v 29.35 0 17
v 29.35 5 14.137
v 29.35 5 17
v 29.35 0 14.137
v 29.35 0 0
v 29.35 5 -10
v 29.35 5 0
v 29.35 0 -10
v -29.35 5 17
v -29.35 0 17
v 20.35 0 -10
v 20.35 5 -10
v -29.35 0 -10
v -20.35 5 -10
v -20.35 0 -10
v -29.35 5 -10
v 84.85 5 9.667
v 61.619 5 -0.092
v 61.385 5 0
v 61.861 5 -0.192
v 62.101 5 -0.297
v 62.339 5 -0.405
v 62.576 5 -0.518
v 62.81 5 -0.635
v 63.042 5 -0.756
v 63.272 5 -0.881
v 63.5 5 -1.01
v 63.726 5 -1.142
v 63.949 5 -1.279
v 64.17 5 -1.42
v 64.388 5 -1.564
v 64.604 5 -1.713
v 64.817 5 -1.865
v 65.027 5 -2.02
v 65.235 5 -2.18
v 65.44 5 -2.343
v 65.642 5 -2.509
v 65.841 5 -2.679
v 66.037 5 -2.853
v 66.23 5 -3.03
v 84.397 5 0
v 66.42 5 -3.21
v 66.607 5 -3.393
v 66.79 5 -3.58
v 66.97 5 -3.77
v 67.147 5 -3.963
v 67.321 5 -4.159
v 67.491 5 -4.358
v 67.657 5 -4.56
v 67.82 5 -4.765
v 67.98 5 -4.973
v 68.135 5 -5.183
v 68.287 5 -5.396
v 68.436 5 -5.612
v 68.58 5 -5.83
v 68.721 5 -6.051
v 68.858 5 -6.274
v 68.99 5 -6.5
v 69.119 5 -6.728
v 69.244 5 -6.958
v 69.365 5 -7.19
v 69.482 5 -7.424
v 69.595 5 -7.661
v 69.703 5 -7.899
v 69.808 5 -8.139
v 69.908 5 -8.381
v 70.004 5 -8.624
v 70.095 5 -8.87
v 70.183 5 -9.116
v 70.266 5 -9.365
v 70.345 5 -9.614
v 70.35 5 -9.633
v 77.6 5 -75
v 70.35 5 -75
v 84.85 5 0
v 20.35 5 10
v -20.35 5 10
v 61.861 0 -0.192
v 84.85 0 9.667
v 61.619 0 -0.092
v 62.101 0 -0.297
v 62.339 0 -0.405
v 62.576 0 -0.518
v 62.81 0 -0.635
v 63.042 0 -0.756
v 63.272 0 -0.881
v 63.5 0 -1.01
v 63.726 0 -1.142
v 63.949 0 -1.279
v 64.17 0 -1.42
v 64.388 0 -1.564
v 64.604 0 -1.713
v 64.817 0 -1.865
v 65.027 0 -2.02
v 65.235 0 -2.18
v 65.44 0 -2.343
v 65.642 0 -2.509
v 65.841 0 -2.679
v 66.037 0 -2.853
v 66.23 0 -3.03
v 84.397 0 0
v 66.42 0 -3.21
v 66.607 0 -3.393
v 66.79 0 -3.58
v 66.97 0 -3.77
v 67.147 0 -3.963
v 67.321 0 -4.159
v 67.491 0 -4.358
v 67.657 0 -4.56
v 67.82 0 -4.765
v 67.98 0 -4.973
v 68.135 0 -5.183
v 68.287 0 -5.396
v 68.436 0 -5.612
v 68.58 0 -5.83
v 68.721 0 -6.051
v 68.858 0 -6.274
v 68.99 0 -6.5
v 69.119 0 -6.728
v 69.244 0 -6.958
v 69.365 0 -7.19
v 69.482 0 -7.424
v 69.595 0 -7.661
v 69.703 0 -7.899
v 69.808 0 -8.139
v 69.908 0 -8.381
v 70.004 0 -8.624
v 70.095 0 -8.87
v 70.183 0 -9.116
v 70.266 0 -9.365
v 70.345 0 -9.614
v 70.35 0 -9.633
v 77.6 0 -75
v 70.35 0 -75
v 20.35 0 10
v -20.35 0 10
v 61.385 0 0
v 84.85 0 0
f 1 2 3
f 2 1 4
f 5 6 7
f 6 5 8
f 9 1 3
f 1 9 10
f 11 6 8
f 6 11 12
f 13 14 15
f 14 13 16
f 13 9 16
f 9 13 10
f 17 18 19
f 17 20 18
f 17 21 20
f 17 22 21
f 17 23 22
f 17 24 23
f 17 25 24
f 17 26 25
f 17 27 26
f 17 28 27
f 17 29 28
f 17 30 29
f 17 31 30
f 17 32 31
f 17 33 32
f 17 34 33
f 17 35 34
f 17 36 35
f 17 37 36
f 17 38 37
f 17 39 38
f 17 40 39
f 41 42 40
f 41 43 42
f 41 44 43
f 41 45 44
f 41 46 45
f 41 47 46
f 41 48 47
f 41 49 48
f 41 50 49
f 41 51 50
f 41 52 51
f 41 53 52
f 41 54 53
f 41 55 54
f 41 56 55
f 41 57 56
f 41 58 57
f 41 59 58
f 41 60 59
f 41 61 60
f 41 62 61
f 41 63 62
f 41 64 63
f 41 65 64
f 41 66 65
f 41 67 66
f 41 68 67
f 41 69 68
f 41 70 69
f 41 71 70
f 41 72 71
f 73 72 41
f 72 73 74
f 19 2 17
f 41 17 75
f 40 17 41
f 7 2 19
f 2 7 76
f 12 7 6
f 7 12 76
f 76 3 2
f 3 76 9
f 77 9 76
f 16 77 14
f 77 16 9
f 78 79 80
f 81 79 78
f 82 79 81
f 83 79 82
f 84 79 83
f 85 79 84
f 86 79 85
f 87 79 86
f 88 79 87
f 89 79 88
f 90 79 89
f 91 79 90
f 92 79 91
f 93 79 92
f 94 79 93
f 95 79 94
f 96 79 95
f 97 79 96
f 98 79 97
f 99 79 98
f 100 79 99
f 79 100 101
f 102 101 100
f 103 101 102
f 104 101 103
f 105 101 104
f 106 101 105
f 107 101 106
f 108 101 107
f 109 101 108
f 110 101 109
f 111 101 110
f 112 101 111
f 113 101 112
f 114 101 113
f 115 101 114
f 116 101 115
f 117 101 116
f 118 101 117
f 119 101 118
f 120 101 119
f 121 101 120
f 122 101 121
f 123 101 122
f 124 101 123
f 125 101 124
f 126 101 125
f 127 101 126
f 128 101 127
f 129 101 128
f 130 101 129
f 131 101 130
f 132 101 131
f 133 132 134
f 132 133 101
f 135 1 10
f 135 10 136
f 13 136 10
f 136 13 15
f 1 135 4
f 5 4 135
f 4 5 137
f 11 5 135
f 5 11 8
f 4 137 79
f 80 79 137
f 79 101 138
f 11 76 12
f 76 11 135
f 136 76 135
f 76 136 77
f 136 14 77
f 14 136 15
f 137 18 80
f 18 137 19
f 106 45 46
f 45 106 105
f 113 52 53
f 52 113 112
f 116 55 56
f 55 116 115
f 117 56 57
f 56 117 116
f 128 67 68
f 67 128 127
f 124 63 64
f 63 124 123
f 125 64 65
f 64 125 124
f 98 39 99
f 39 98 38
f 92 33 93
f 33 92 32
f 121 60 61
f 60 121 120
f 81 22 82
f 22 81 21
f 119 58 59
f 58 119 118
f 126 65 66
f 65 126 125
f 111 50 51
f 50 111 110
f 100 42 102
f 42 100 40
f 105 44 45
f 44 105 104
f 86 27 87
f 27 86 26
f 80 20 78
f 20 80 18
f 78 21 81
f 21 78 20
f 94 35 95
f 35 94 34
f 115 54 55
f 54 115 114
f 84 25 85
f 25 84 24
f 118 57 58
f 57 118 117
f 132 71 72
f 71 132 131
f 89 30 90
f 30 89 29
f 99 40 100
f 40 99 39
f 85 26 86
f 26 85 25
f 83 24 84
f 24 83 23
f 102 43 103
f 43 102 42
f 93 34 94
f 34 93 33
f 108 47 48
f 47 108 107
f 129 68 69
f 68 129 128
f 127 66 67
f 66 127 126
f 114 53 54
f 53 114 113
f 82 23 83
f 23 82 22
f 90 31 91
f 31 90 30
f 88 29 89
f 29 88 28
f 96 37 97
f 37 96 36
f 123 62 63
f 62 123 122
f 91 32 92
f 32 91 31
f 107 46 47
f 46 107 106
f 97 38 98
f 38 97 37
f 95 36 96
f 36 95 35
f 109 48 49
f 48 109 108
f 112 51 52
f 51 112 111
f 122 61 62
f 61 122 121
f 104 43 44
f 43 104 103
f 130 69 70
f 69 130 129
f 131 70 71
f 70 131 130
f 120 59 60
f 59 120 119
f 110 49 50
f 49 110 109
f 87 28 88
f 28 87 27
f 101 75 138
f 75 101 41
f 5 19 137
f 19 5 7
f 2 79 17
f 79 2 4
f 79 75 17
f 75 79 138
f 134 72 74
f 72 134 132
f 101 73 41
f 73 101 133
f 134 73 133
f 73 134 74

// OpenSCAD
// file: servomotor.scad
sm_body_x = 40.7;
sm_body_y = 20;
sm_body_z = 40.6;

module servomotor () {
    $fa = 1;
    $fs = 0.1;
    union() {
        translate([0, 0, 20.25]) {
            cube([sm_body_x, sm_body_y, sm_body_z], center=true);
        }
        difference() {
            translate([0, 0, 30.1]) {
                cube([53.9, 18.3, 2.4], center=true);
            }
            union() {
                translate([24.6, 5.5/2 + 2.4/2, 30.1]) {
                    cylinder(2.6, 2.4, 2.4, center=true);
                }
                translate([24.6, -(5.5/2 + 2.4/2), 30.1]) {
                    cylinder(2.6, 2.4, 2.4, center=true);
                }
                translate([-(24.6), 5.5/2 + 2.4/2, 30.1]) {
                    cylinder(2.6, 2.4, 2.4, center=true);
                }
                translate([-(24.6), -(5.5/2 + 2.4/2), 30.1]) {
                    cylinder(2.6, 2.4, 2.4, center=true);
                }

            }
        }
        translate([-(26.7 - 40.7/2 + 2.9/2), 0, 42.4]) {
            cylinder(4, 2.9, 2.9, center=true);
        }
    }

}
// main file
include <servomotor.scad>




module arm(l = 50, w = 5, h1 = 5, h2 = 3) {
    points = [
    [ 0,  0,  0 ],
    [ l,  0,  0 ],
    [ l,  w,  0 ],
    [ 0,  w,  0 ],
    [ 0,  0,  h1 ],
    [ l,  0,  h2 ],
    [ l,  w,  h2 ],
    [ 0,  w,  h1 ]];
    
    faces = [
    [0,1,2,3],  // bottom
    [4,5,1,0],  // front
    [7,6,5,4],  // top
    [5,6,2,1],  // right
    [6,7,3,2],  // back
    [7,4,0,3]]; // left
    polyhedron( points = points, faces = faces);
 
}

module corner(h = 2, l= 4) {
    $fa = 1;
    $fs = 0.1;
    difference() {
        cube([l, l, h]);
        translate([0, 0, -1]) {
            cylinder(h + 2, l, l);
        } 
    }
}

translate([0, 28.7, 0]) {
    rotate([90, 0, 0]) {
        %servomotor();
    } 
}

body_w = 9;
body_x = sm_body_x + body_w*2;
body_y = 5;
body_z = sm_body_y + body_w;

translate([-body_x/2, 0, -sm_body_y/2]) {
    difference() {
        cube([body_x, body_y, body_z - 2]);
        translate([(body_x - sm_body_x)/2, -1, 0]) {
            cube([sm_body_x, body_y + 2, body_z - body_w]);
        }
    }

} 

arm1_l = 60;
arm1_w = 5;
arm1_h1 = body_z/2;
arm1_h2 = body_z / 3;
translate([body_x/2 - body_w/2, 0,0]) {
    arm(arm1_l, arm1_w, arm1_h1, arm1_h2);
} 

arm2_l = 80;
arm2_w = 5;
arm2_h1 = body_z/2;
arm2_h2 = body_z / 4;
translate([body_x/2 - body_w/2 + arm1_l - arm2_h1, 0,5]) {
    rotate([0, 90, 0]) {
        arm(arm2_l, arm2_w, arm2_h1, arm2_h2);
    }
} 

corner_size = 15;
translate([56,arm1_w,-corner_size + 1]) {
    rotate([90, 0, 0]) {
        corner(h=arm1_w, l=corner_size);
    }
} 
